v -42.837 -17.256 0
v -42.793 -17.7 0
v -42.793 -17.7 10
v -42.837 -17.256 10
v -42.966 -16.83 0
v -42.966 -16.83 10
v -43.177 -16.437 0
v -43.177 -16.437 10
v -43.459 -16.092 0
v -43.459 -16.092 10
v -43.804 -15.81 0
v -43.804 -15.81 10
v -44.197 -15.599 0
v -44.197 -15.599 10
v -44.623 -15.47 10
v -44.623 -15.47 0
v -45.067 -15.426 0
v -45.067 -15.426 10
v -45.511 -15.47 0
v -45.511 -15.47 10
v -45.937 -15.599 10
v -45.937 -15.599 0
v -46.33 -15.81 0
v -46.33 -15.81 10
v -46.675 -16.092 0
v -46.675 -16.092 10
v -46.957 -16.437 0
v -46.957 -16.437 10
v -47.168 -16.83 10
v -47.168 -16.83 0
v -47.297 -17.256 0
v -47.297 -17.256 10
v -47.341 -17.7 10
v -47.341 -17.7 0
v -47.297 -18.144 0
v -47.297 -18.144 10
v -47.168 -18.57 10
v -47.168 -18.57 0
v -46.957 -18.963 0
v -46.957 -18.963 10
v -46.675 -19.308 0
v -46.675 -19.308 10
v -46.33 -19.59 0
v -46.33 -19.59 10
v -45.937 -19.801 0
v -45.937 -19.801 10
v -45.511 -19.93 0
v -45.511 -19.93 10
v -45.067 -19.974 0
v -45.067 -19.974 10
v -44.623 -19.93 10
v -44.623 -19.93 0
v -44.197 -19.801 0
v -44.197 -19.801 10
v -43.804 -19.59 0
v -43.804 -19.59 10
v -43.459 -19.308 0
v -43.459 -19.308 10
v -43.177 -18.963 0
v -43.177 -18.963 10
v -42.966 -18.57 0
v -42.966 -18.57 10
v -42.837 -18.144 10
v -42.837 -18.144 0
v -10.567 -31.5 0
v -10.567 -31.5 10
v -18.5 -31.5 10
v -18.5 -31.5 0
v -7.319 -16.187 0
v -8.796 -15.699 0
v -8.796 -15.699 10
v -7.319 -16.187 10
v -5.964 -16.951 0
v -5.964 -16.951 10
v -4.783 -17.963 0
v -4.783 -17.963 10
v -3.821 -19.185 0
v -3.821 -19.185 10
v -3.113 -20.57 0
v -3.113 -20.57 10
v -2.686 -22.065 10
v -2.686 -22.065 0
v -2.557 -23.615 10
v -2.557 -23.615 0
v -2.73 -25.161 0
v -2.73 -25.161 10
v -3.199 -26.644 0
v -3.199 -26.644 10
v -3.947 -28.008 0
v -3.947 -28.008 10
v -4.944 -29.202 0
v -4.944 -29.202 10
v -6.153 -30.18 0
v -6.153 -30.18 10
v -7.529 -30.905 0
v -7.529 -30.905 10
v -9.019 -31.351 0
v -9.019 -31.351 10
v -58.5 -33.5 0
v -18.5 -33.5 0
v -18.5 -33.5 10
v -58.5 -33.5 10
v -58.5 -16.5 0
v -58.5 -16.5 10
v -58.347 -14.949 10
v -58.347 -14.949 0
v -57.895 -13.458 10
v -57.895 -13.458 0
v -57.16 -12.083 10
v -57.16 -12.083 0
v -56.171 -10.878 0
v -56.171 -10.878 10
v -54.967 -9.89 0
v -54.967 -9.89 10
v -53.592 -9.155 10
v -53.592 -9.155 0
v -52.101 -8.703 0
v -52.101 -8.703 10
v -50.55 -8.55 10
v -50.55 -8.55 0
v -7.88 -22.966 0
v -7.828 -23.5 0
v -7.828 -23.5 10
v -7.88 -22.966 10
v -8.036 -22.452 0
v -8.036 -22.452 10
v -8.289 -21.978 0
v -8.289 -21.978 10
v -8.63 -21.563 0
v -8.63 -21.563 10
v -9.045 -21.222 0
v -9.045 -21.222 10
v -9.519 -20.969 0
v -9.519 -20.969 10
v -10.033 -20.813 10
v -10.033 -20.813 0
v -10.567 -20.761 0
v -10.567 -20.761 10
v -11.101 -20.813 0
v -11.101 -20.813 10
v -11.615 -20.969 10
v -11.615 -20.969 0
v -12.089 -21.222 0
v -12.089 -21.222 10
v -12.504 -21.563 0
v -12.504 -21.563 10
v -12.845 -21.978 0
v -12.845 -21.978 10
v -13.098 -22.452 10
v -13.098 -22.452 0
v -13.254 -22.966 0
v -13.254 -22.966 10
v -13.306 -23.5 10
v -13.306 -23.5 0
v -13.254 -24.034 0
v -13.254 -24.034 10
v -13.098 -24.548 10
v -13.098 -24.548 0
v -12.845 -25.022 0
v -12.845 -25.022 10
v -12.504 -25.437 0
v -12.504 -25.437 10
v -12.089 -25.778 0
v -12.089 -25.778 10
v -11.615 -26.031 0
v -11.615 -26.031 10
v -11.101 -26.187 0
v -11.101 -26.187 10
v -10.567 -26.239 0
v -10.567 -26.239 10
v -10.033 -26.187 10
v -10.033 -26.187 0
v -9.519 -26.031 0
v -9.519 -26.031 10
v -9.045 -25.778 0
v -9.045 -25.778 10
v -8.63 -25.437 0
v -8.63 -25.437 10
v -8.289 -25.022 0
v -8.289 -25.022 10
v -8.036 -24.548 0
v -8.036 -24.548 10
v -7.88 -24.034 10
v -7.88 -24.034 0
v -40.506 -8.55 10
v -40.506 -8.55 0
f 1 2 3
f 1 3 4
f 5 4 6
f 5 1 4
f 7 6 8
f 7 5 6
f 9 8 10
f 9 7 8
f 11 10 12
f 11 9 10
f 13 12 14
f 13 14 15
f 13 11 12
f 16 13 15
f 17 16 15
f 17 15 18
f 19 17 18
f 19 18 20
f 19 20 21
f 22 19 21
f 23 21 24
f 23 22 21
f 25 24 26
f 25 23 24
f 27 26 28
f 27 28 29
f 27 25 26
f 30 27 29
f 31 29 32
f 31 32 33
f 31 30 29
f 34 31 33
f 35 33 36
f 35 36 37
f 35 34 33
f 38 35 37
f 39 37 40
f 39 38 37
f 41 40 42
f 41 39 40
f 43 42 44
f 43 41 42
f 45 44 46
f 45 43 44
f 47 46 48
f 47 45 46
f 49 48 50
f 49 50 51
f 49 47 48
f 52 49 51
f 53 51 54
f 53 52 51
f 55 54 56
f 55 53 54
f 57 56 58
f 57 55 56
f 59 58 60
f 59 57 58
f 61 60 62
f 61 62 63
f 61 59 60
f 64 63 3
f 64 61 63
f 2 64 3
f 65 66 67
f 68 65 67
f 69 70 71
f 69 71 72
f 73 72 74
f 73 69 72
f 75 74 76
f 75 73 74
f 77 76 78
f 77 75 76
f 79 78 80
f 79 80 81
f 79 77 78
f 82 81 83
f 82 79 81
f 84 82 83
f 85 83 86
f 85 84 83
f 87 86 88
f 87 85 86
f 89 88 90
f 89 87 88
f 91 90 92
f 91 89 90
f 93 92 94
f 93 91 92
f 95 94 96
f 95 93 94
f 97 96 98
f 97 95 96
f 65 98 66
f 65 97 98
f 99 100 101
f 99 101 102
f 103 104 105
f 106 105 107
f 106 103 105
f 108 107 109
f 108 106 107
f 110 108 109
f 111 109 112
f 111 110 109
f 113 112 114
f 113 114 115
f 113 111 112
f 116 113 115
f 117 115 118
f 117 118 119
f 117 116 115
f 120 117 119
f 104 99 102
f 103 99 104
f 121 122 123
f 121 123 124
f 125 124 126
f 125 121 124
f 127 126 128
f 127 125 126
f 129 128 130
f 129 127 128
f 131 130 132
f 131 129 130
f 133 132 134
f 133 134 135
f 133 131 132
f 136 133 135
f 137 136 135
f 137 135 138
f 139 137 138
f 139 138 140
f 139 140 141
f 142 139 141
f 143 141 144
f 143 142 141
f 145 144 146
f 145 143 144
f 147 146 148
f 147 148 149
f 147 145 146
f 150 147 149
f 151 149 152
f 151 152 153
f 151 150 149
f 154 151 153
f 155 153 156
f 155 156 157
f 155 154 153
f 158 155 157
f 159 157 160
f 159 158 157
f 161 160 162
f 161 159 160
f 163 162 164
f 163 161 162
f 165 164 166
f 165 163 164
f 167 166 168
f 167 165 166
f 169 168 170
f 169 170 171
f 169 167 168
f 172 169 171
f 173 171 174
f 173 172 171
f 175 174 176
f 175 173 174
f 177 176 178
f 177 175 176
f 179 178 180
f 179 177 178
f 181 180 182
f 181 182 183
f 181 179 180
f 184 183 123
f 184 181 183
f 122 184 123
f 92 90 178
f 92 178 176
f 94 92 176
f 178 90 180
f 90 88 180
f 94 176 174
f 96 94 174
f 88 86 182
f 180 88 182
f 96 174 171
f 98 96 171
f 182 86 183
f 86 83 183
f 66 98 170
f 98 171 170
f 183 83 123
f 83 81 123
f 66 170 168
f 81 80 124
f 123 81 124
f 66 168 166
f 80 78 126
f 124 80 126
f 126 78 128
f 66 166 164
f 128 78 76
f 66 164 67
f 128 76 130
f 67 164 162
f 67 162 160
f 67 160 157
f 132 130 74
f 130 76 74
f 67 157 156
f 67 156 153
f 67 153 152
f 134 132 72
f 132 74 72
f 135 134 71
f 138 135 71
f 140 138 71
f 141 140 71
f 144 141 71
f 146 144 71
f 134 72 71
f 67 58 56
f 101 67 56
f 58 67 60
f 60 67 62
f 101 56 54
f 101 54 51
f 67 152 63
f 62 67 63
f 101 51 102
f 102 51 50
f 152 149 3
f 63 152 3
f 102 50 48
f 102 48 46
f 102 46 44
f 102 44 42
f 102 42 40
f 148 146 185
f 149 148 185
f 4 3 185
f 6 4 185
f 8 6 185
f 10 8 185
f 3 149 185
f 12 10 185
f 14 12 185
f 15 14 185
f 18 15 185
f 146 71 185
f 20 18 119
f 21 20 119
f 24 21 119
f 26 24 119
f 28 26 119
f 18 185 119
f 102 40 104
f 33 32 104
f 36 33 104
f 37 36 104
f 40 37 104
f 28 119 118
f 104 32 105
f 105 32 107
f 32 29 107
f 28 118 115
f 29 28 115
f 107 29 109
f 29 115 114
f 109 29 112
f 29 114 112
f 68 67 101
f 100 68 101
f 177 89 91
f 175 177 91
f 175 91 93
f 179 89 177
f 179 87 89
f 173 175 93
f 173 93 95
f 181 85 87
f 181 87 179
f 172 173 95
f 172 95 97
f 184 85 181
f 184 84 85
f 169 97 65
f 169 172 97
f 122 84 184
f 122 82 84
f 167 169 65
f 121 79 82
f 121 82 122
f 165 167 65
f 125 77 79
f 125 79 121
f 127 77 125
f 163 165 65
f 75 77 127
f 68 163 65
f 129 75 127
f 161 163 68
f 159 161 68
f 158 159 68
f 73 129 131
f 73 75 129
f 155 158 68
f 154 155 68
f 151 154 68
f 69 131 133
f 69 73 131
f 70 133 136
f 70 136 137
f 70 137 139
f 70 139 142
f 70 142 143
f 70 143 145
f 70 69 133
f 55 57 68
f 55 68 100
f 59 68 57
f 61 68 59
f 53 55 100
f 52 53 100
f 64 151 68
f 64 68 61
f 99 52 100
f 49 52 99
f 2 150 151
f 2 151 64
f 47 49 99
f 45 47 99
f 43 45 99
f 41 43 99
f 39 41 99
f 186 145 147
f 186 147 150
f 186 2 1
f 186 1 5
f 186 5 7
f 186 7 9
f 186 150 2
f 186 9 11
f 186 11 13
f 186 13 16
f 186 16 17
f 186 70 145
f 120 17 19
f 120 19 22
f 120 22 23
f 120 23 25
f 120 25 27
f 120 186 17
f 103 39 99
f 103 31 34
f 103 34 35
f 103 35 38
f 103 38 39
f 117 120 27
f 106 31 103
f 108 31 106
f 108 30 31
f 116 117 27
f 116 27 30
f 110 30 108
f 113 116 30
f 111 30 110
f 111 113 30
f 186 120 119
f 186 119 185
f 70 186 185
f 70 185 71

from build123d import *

# Parameters (mm, degrees)
CROQUIS1_R              = 2.273640803
CROQUIS1_R_2            = 2.739354484
SALIENTE_EXTRUIR1_DEPTH = 10


with BuildPart() as part:
    # Croquis1 → Saliente-Extruir1 (new body)
    with BuildSketch(Plane.XY):
        with BuildLine():
            Line((-58.5, -33.5), (-58.5, -16.5))
            ThreePointArc((-58.5, -16.5), (-56.171439372, -10.87835735), (-50.549796722, -8.549796722))
            Line((-50.549796722, -8.549796722), (-40.505582208, -8.549796722))
            Line((-40.505582208, -8.549796722), (-8.795660821, -15.698566958))
            ThreePointArc((-8.795660821, -15.698566958), (-2.605899054, -24.392438678), (-10.567, -31.5))
            Line((-10.567, -31.5), (-18.5, -31.5))
            Line((-18.5, -31.5), (-18.5, -33.5))
            Line((-18.5, -33.5), (-58.5, -33.5))
        make_face()
        with Locations((-45.067, -17.7)):
            Circle(CROQUIS1_R, mode=Mode.SUBTRACT)
        with Locations((-10.567, -23.5)):
            Circle(CROQUIS1_R_2, mode=Mode.SUBTRACT)
    extrude(amount=SALIENTE_EXTRUIR1_DEPTH)


solid = part.part
